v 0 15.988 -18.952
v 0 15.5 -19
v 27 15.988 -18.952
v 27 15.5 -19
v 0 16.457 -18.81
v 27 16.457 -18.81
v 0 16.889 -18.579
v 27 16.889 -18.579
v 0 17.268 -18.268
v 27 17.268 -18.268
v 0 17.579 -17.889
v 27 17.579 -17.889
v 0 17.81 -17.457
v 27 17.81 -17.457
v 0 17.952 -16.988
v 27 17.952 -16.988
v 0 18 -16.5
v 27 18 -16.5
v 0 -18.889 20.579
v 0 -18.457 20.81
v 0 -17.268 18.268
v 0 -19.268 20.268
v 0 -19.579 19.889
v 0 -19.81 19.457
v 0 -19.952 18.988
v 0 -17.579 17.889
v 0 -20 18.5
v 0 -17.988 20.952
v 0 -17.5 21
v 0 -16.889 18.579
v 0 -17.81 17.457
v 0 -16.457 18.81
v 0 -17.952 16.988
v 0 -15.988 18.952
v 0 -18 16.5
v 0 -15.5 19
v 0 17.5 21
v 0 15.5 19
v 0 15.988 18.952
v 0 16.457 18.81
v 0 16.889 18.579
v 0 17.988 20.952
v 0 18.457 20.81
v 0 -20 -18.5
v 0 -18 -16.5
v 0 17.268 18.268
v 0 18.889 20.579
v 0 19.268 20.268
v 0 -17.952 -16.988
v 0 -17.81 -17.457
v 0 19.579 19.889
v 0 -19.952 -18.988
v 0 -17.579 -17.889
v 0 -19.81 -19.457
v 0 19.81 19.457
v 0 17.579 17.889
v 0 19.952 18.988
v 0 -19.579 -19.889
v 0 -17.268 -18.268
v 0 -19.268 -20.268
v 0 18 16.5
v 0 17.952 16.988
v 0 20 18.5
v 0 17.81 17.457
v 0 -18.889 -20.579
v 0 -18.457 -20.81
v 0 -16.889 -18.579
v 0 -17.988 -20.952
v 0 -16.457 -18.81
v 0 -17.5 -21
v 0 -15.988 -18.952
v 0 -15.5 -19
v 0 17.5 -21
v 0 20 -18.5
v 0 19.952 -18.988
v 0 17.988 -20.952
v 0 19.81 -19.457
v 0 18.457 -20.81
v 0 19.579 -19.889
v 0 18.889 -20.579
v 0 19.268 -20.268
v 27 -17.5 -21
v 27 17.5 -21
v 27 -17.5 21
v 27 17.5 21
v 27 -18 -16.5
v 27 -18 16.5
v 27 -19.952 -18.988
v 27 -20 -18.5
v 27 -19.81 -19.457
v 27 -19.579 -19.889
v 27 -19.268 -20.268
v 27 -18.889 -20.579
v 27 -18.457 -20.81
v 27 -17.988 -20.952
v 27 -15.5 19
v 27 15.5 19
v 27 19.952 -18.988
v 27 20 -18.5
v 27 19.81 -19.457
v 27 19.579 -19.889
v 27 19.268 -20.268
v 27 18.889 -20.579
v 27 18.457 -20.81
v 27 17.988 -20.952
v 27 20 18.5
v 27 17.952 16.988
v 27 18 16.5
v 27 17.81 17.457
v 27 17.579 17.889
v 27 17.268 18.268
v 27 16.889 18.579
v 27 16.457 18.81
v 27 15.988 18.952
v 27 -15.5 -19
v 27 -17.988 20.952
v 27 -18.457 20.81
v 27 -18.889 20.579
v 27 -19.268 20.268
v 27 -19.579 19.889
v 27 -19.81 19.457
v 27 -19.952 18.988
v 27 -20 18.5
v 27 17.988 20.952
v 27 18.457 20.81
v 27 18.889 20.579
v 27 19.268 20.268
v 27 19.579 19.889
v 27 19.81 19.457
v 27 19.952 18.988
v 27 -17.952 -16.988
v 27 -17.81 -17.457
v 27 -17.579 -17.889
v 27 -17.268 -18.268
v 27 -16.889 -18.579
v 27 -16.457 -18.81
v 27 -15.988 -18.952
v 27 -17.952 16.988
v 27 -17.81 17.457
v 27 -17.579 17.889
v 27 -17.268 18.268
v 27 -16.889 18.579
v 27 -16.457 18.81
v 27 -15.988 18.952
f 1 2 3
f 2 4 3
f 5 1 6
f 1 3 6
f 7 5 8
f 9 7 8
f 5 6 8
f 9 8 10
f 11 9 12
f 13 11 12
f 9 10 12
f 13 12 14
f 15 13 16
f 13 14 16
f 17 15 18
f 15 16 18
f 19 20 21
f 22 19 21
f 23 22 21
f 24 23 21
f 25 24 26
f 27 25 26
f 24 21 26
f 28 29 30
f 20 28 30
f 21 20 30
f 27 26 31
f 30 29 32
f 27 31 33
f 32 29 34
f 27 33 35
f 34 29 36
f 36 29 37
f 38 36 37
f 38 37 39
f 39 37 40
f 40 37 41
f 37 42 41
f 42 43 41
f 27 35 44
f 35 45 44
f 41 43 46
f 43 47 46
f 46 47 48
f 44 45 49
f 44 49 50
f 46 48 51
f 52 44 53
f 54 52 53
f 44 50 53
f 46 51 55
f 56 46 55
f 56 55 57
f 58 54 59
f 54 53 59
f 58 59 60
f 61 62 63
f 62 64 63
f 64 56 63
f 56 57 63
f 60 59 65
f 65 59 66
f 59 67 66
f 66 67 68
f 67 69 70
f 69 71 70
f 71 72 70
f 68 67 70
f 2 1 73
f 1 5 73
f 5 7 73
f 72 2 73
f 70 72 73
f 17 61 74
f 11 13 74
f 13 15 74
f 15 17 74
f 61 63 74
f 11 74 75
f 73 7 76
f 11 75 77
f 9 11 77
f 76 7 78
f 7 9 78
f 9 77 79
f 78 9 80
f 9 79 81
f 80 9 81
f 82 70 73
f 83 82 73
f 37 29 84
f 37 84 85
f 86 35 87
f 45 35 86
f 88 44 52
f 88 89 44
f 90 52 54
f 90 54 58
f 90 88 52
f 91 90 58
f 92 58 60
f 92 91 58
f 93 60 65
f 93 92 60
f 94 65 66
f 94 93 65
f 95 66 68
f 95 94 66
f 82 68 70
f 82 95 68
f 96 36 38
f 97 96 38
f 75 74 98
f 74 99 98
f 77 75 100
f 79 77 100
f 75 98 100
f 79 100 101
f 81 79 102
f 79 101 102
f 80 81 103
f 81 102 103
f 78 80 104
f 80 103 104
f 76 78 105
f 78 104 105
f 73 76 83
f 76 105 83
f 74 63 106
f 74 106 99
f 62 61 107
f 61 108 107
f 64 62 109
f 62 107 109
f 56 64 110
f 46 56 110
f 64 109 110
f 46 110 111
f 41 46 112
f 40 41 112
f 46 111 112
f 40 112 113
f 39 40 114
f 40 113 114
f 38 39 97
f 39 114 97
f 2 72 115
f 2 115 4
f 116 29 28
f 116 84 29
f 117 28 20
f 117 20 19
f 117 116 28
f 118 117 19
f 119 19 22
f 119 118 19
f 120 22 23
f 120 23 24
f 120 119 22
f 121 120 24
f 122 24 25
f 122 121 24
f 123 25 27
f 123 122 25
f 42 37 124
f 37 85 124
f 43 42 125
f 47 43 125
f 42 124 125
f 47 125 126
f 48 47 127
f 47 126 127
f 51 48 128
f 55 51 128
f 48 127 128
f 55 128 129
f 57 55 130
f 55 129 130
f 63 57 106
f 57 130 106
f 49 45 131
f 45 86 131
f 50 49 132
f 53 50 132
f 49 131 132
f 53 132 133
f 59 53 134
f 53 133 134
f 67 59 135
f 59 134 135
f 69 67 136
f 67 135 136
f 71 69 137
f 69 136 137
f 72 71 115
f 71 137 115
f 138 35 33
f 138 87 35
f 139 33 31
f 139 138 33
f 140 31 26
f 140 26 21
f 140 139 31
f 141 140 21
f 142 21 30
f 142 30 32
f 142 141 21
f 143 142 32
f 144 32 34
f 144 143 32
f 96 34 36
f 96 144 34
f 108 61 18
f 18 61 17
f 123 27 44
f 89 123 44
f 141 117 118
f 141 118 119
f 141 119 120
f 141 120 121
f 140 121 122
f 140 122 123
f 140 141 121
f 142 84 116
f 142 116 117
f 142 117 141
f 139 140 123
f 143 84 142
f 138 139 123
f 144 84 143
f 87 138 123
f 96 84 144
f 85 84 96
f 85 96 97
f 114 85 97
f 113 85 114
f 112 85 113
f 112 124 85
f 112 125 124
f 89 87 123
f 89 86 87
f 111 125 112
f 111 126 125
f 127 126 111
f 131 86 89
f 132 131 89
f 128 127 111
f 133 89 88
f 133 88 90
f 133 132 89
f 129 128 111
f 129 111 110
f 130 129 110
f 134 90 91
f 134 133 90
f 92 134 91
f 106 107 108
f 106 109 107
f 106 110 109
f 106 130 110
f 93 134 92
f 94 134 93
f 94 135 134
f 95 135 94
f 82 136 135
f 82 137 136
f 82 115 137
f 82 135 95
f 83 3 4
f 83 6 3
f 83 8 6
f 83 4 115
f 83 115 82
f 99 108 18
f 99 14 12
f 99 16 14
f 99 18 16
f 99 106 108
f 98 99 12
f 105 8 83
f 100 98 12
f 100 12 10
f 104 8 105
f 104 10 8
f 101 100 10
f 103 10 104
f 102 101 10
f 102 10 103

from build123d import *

# Parameters (mm, degrees)
SKETCH_1_W      = 42
SKETCH_1_H      = 40
SKETCH_1_W_2    = 38
SKETCH_1_H_2    = 36
EXTRUDE_1_DEPTH = 27
FILLET_1_R      = 2.5


with BuildPart() as part:
    # 草图1 → 凸台-拉伸1 (new body)
    with BuildSketch(Plane(origin=(0, 0, 0), x_dir=(0, 0, -1), z_dir=(1, 0, 0))):
        Rectangle(SKETCH_1_W, SKETCH_1_H)
        Rectangle(SKETCH_1_W_2, SKETCH_1_H_2, mode=Mode.SUBTRACT)
    extrude(amount=EXTRUDE_1_DEPTH)

    # 圆角1
    fillet_1_edges = [part.edges().sort_by_distance(p)[0] for p in [
        (13.5, -18, -19),
        (13.5, 18, -19),
        (13.5, 18, 19),
        (13.5, -18, 19),
        (13.5, 20, 21),
        (13.5, 20, -21),
        (13.5, -20, -21),
        (13.5, -20, 21),
    ]]
    fillet(fillet_1_edges, radius=FILLET_1_R)


solid = part.part
